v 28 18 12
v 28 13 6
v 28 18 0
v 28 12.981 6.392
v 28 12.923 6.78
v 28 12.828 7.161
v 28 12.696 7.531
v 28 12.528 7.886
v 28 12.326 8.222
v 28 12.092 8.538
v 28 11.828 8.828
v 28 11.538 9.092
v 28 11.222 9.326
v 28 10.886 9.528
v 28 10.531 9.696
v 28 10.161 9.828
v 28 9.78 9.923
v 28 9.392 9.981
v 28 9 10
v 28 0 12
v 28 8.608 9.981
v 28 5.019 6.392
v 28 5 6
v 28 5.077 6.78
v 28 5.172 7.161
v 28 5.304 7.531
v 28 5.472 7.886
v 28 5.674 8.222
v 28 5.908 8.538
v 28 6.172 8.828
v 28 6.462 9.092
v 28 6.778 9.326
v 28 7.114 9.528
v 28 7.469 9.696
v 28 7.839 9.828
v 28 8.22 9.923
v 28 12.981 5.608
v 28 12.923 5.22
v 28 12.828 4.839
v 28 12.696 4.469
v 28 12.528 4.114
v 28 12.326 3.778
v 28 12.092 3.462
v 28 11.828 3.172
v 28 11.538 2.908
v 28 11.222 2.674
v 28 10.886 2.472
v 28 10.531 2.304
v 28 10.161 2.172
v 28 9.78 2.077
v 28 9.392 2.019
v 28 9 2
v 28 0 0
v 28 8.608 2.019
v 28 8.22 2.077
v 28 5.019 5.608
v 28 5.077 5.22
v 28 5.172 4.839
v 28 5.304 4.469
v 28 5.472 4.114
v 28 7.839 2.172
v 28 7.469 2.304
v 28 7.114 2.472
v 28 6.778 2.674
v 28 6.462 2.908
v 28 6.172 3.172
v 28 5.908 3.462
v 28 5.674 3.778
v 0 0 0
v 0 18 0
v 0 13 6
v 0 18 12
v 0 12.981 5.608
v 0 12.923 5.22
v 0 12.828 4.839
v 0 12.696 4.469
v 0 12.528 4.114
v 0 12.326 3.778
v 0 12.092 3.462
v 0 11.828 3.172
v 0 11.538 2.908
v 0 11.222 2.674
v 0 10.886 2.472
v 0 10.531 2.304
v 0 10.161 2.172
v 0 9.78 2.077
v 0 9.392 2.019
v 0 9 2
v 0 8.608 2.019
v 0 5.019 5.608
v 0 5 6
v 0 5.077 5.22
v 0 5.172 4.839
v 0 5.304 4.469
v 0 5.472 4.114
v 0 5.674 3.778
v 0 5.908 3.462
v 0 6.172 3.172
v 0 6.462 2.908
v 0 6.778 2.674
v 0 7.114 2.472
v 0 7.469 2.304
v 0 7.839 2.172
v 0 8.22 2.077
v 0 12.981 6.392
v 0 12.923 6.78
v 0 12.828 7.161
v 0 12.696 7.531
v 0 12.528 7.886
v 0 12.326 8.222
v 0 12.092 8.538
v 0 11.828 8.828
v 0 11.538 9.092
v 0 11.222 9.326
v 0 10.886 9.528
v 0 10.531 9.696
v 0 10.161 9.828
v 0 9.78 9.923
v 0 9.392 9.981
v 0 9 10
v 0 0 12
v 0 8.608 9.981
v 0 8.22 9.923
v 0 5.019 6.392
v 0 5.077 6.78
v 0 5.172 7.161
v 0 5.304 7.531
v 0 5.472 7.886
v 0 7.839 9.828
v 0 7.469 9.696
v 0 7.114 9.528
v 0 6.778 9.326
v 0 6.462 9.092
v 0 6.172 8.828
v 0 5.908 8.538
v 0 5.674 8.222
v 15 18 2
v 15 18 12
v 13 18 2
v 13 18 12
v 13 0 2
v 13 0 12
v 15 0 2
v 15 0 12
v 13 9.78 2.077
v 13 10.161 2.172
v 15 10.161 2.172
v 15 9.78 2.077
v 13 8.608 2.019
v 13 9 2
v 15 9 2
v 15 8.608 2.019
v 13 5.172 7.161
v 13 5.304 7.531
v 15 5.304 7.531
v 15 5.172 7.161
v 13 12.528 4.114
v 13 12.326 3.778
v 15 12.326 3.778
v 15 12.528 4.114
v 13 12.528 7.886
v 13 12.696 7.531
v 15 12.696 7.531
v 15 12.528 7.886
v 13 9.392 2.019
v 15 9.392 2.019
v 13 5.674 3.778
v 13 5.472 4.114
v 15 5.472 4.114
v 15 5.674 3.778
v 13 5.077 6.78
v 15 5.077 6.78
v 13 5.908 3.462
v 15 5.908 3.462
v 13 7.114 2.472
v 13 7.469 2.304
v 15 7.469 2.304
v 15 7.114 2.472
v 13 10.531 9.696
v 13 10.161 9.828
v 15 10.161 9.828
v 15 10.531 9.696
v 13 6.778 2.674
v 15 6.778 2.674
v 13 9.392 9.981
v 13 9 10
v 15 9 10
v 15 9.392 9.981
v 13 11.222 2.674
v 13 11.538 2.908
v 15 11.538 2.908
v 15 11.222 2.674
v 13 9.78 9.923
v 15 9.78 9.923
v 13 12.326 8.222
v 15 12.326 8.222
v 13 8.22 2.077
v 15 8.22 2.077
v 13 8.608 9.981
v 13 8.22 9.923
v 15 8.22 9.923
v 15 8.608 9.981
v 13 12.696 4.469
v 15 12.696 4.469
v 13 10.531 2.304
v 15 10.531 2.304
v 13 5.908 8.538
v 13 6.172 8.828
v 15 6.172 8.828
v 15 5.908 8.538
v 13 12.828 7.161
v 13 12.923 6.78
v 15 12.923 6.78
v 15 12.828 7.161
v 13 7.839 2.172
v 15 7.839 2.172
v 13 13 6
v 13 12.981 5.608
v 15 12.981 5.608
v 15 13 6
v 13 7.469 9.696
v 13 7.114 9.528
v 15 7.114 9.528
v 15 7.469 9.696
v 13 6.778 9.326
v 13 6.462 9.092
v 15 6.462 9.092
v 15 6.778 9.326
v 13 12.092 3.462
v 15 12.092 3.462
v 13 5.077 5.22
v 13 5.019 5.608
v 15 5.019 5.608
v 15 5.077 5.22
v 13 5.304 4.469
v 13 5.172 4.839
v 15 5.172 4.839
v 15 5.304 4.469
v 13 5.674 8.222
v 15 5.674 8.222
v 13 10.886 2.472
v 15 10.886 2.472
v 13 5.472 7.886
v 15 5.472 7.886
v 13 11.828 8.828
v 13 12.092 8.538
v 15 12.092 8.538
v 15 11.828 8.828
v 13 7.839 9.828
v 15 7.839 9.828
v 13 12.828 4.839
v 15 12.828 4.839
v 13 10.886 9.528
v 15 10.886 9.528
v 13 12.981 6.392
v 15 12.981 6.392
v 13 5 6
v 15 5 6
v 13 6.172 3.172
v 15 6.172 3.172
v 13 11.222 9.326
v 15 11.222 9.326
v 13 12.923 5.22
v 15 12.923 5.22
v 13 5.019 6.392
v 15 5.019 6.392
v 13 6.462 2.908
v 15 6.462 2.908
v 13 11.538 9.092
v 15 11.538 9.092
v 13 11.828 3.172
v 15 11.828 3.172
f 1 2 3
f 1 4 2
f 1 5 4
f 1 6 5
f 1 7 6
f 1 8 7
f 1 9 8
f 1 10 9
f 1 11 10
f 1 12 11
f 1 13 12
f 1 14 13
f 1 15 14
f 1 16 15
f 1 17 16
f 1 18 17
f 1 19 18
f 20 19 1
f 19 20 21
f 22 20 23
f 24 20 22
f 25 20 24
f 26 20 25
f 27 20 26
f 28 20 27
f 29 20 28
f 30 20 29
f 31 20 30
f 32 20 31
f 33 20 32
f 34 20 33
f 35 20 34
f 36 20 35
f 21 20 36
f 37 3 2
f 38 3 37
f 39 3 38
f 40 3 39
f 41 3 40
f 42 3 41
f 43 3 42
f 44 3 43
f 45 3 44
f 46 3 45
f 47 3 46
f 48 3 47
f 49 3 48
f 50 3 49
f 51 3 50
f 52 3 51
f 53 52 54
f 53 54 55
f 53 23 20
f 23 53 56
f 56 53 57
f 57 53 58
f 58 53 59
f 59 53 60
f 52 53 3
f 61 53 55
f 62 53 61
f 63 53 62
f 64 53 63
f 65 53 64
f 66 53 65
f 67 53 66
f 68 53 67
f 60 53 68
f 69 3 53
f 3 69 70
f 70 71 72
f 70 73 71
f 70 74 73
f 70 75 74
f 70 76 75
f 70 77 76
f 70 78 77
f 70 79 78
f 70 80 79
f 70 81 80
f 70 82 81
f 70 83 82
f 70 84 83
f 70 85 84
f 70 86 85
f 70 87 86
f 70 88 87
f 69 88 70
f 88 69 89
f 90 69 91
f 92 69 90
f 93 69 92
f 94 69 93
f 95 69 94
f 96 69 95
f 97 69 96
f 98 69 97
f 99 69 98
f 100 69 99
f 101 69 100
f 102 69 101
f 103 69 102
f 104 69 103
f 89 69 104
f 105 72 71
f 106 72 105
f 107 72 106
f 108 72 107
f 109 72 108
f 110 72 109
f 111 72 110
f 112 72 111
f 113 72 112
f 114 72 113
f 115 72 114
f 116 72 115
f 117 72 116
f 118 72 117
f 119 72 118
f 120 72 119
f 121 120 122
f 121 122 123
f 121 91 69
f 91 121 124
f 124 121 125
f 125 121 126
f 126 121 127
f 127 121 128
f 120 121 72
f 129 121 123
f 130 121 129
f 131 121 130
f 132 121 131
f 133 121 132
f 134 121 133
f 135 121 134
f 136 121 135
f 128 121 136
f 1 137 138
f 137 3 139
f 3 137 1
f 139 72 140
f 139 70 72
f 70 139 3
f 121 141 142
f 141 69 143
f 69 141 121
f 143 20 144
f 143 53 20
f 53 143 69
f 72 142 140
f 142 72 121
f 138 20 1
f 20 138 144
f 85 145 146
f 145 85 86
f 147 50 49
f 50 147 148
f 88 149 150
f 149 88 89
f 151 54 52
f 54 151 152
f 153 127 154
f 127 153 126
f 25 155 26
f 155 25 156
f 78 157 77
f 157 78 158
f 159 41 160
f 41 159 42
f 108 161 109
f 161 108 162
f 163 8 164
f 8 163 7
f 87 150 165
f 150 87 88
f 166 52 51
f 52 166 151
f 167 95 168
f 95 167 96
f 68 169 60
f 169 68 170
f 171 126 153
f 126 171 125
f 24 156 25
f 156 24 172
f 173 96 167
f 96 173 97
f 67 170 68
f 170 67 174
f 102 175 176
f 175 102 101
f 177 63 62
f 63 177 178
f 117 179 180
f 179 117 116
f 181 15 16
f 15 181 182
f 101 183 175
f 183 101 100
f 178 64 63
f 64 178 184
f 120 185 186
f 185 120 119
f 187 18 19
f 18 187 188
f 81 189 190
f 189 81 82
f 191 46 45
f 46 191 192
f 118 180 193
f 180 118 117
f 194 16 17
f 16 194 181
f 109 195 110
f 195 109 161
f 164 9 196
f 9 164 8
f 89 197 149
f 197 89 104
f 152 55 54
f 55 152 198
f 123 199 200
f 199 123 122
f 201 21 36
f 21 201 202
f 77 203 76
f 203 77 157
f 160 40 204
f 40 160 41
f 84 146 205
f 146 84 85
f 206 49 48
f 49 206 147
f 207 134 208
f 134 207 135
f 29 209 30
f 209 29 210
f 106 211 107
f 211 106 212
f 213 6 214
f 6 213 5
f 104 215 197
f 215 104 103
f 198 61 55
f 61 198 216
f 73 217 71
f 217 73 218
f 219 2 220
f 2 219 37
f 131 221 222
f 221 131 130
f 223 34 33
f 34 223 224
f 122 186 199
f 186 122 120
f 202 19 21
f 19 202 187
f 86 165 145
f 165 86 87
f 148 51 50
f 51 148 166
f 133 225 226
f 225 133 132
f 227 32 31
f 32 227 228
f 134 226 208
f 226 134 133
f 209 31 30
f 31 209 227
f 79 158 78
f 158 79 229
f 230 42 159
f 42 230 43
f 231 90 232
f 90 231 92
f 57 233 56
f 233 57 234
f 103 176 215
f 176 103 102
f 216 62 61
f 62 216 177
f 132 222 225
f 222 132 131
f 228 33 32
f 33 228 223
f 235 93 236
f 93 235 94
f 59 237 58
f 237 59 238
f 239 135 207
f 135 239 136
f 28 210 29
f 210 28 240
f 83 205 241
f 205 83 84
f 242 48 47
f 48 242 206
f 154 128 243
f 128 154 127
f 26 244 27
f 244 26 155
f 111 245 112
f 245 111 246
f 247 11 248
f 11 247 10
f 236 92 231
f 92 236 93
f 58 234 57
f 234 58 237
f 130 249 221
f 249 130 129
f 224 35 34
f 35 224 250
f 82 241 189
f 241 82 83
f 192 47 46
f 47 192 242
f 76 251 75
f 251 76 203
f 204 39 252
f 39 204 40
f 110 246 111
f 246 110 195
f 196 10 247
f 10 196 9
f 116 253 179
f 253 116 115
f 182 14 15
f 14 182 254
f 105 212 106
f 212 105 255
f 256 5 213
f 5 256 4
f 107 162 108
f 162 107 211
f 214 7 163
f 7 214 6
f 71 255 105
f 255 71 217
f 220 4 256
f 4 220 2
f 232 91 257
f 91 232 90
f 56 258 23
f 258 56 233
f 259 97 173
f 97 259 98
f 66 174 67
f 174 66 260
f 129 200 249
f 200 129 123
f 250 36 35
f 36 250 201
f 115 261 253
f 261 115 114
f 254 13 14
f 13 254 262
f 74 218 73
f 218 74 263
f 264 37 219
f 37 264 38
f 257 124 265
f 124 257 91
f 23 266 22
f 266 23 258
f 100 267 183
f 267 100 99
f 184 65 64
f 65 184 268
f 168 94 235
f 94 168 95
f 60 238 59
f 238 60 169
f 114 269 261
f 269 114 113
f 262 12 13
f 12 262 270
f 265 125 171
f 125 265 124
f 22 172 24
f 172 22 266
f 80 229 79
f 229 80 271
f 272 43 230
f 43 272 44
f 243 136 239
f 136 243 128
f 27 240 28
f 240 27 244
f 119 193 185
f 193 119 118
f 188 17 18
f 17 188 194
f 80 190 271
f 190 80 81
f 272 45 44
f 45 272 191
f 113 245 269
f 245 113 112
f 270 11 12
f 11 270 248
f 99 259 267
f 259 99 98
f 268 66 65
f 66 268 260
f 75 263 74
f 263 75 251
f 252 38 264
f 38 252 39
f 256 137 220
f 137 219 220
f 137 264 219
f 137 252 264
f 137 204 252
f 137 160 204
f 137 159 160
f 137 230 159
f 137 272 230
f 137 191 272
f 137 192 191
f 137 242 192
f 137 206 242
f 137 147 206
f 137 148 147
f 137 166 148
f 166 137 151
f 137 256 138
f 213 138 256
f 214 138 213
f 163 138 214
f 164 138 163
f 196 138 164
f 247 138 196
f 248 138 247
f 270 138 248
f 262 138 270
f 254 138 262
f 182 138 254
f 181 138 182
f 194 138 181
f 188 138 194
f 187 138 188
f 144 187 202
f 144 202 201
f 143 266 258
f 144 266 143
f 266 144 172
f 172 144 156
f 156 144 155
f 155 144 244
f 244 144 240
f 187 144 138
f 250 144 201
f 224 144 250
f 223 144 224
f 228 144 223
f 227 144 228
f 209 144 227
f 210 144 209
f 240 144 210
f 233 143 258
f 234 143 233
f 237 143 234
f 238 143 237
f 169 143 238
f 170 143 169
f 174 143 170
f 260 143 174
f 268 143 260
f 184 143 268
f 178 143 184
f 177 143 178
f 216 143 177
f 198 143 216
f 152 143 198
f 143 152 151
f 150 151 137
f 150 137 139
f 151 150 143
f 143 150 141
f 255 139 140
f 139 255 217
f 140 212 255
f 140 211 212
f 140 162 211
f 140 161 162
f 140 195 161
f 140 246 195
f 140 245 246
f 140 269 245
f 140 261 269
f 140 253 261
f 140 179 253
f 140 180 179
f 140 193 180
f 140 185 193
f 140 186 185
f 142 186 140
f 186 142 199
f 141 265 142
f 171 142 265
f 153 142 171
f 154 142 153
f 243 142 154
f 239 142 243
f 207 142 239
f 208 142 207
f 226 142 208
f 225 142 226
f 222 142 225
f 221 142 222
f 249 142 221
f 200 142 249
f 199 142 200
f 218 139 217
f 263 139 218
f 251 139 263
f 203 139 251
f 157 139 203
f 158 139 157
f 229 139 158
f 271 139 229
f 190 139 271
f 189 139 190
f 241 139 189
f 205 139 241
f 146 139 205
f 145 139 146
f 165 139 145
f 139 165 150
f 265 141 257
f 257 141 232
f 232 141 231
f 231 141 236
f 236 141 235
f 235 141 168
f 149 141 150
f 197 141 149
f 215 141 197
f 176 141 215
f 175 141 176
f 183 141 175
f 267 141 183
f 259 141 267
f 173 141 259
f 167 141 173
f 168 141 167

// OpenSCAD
clip_width = 28;
clip_depth = 18;
clip_height = 12;
slot_diameter = 8;
gap_width = 2;
base_thickness = 2;

module main() {
    difference() {
        union() {
            cube([clip_width, clip_depth, base_thickness], center = false);
            translate([0, 0, base_thickness])
                cube([
                    clip_width,
                    clip_depth,
                    clip_height - base_thickness
                ], center = false);
        }
        translate([
            clip_width / 2,
            clip_depth / 2,
            base_thickness + slot_diameter / 2
        ])
            rotate([0, 90, 0])
                cylinder(d = slot_diameter, h = clip_width + 4, center = true, $fn = 64);
        translate([
            (clip_width - gap_width) / 2,
            -1,
            base_thickness
        ])
            cube([gap_width, clip_depth + 2, clip_height], center = false);
    }
}

main();
